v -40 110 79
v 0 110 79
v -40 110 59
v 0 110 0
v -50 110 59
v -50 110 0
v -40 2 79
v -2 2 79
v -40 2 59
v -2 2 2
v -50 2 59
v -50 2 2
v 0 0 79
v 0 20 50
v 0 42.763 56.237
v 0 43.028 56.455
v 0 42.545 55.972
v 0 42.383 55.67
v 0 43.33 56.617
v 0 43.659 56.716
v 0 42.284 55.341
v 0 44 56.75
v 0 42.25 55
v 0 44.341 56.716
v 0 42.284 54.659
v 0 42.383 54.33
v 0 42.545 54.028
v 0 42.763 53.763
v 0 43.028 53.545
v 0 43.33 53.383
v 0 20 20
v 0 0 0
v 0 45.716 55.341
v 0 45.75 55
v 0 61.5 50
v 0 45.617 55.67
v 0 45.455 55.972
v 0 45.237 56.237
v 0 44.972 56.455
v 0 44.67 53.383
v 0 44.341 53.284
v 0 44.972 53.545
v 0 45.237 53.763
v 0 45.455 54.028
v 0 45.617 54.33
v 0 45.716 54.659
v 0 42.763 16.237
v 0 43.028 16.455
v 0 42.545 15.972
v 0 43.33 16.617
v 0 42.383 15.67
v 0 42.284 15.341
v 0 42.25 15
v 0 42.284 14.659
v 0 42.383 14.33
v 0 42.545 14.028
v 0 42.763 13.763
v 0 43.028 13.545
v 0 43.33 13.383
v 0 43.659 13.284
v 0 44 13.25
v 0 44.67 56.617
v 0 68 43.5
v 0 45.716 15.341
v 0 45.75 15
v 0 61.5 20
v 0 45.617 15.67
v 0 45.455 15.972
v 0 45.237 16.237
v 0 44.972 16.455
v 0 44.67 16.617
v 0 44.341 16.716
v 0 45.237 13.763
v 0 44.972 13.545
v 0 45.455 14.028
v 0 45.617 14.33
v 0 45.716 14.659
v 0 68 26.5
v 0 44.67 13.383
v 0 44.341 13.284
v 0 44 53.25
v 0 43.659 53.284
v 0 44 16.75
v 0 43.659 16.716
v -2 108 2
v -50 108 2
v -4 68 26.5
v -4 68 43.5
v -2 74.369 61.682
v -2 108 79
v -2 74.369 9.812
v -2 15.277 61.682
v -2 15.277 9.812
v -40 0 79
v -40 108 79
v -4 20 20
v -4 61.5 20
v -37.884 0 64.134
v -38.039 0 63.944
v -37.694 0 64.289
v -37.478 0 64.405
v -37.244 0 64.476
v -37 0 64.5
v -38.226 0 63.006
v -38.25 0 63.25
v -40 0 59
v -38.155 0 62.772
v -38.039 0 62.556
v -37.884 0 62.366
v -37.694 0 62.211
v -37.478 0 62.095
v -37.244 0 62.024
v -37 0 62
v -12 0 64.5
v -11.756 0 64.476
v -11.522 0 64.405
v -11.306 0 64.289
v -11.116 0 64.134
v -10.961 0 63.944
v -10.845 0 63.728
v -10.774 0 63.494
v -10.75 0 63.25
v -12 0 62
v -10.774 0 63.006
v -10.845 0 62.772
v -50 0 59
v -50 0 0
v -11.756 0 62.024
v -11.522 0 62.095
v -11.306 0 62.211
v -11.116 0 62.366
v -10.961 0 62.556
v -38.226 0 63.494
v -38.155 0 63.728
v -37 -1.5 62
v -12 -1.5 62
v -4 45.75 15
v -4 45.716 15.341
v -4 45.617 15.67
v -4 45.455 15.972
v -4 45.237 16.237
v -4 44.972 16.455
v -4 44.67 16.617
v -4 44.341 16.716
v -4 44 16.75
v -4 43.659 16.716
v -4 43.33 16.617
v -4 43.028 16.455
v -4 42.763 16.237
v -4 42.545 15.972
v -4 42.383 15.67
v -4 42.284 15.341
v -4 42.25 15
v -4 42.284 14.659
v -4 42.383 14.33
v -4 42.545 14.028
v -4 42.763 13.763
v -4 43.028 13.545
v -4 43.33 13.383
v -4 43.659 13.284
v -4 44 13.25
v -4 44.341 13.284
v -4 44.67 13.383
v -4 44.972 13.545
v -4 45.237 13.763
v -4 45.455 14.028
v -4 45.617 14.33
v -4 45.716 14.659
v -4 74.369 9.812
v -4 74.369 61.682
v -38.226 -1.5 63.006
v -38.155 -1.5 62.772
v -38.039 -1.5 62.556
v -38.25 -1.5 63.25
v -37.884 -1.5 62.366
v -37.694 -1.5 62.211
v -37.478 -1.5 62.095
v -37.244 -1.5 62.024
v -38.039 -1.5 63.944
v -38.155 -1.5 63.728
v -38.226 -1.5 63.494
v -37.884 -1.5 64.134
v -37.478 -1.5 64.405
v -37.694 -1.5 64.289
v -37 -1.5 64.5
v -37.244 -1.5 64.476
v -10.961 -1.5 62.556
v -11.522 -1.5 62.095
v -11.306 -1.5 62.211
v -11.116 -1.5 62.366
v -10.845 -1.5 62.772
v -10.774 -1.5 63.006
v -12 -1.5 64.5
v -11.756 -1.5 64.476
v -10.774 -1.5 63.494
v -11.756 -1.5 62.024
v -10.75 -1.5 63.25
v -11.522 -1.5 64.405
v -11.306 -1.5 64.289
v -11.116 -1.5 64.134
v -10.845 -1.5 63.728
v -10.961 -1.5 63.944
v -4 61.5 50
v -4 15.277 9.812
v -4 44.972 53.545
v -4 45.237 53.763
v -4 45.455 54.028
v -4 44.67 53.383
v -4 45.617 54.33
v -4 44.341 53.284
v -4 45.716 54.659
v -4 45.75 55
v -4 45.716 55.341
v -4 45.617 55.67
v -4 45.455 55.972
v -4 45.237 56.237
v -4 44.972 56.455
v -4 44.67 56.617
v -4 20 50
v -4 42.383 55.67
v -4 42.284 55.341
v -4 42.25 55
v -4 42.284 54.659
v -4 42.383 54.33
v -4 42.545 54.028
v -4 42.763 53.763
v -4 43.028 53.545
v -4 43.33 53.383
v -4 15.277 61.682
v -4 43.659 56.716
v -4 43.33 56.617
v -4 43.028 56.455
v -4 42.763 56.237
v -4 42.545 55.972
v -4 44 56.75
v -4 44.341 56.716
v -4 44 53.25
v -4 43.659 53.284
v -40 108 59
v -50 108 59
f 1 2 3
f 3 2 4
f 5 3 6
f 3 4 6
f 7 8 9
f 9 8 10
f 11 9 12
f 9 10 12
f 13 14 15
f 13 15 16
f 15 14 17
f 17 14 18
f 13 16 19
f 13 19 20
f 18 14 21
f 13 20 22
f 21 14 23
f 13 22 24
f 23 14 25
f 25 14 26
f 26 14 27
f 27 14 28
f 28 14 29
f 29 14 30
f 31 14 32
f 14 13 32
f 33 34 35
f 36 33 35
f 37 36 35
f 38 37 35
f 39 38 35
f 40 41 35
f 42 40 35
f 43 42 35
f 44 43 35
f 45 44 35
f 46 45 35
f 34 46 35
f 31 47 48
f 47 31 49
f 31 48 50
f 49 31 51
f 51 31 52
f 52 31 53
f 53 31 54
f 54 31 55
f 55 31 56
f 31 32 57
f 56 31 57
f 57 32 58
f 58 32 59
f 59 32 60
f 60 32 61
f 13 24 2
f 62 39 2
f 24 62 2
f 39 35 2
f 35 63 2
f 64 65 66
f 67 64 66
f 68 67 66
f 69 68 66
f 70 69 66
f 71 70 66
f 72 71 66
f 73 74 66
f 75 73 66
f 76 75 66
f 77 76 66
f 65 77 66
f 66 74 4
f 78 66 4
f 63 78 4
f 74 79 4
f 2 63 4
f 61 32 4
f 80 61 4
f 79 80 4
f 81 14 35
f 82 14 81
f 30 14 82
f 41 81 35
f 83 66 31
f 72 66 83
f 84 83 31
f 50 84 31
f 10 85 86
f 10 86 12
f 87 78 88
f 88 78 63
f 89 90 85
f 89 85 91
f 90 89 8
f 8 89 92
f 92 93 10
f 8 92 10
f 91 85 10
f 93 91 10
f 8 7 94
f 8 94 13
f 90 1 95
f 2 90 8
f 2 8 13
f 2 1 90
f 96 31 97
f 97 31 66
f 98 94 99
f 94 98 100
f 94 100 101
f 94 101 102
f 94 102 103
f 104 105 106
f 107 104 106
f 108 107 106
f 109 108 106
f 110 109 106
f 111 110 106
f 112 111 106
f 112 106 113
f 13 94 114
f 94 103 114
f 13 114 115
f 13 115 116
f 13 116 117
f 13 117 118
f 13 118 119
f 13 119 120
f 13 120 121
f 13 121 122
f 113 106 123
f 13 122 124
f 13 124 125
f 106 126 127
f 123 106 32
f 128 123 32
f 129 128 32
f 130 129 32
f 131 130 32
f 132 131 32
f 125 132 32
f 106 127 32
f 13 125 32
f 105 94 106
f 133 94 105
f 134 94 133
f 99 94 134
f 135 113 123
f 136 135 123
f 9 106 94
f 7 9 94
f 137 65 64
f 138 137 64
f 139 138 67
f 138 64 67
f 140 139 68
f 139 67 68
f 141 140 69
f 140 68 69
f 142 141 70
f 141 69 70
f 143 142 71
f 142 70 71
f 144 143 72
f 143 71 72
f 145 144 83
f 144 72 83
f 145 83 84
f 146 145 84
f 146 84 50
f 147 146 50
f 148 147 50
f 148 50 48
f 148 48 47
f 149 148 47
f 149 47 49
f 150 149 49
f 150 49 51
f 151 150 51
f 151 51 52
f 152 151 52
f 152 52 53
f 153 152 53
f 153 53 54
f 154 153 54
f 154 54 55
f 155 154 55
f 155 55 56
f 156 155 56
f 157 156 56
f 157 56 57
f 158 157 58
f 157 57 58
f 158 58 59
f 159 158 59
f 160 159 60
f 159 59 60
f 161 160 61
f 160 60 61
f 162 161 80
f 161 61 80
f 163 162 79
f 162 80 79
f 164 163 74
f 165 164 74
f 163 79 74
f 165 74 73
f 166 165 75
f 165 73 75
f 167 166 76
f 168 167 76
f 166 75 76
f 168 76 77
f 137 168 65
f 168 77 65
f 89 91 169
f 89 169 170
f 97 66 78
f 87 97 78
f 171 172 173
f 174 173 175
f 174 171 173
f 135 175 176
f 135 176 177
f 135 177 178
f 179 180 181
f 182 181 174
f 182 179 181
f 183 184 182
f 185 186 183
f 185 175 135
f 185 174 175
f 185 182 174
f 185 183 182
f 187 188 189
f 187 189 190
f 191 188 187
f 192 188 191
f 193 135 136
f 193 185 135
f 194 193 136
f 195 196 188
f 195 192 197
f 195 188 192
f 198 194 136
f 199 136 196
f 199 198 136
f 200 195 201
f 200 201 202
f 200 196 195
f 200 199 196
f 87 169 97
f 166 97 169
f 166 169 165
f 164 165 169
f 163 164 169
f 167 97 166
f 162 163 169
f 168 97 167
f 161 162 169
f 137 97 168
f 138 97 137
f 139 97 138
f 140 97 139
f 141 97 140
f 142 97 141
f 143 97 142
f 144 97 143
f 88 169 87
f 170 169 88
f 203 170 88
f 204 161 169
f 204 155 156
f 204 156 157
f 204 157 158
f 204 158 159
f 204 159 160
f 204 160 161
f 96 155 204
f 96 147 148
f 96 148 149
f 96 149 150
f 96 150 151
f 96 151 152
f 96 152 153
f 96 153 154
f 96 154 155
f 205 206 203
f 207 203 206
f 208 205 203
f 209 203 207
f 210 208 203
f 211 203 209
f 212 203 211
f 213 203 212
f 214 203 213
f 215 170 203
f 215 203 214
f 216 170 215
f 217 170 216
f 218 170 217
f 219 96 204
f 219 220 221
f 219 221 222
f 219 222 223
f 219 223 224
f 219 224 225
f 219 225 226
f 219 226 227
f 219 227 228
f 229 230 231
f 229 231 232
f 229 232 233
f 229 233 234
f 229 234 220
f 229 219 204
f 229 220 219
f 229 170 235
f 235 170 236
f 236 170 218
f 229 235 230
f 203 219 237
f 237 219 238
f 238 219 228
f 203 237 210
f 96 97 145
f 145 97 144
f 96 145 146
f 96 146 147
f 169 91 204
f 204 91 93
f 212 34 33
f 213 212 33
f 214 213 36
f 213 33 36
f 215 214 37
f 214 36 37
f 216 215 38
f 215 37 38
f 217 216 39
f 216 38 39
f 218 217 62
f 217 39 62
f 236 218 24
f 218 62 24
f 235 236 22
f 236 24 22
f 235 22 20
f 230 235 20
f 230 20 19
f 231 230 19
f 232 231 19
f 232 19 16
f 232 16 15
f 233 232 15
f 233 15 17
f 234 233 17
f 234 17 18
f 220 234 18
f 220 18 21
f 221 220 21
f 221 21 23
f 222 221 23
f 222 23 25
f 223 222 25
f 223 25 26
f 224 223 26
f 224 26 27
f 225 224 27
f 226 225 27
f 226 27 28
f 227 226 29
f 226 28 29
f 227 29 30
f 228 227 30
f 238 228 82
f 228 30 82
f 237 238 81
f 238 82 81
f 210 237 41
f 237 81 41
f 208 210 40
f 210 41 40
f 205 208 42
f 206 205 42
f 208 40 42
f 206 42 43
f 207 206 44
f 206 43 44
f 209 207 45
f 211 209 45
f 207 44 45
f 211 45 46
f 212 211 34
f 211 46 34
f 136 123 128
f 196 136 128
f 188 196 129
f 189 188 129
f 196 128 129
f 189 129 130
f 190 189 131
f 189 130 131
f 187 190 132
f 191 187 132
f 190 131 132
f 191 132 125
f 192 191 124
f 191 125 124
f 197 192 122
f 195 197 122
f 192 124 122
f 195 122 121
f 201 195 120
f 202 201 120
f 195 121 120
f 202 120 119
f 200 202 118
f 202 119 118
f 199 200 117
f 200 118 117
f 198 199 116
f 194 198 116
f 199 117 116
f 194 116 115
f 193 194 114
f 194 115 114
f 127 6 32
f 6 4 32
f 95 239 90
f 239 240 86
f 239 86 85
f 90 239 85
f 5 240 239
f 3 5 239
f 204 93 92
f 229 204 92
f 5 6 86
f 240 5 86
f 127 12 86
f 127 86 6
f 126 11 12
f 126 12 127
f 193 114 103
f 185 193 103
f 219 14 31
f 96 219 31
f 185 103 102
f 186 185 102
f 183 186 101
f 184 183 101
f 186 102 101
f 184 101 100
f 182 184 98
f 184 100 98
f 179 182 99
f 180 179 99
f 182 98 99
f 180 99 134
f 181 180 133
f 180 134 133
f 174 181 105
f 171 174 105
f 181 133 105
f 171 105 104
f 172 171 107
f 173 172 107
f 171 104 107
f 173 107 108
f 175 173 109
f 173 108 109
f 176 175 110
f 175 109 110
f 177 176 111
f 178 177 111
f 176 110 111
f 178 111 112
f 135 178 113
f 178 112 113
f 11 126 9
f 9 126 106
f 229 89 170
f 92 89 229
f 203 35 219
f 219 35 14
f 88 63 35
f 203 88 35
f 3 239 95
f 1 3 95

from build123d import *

# Parameters (mm, degrees)
F1_DEPTH  = 79
F2_W      = 106
F2_H      = 2
F3_DEPTH  = 48
F4_W      = 10
F4_H      = 20
F5_DEPTH  = 150
F6_W      = 59.092542
F6_H      = 51.87012
F7_DEPTH  = 2
F8_R      = 1.75
F9_DEPTH  = 25
F11_DEPTH = 1.5


with BuildPart() as f1:
    # F0 (on Top) → F1 (new body)
    with BuildSketch(Plane.XY):
        Polygon((0, 110), (-50, 110), (-50, 108), (-2, 108), (-2, 2), (-50, 2), (-50, 0), (0, 0), align=None)
    extrude(amount=F1_DEPTH)

    # F2 (on face) → F3 (join)
    with BuildSketch(Plane(origin=(-2, 0, 0), x_dir=(0, -1, 0), z_dir=(-1, 0, 0))):
        with Locations((-55, 1)):
            Rectangle(F2_W, F2_H)
    extrude(amount=F3_DEPTH)

    # F4 (on face) → F5 (cut)
    with BuildSketch(Plane.XZ):
        with Locations((-45, 69)):
            Rectangle(F4_W, F4_H)
    extrude(amount=-F5_DEPTH, mode=Mode.SUBTRACT)

    # F6 (on face) → F7 (join)
    with BuildSketch(Plane(origin=(-2, 0, 0), x_dir=(0, -1, 0), z_dir=(-1, 0, 0))):
        with Locations((-44.822951, 35.747332)):
            Rectangle(F6_W, F6_H)
    extrude(amount=F7_DEPTH)

    # F8 (on face) → F9 (cut)
    with BuildSketch(Plane.YZ):
        Polygon((61.5, 50), (20, 50), (20, 20), (61.5, 20), (68, 26.5), (68, 43.5), align=None)
        with Locations((44, 55)):
            Circle(F8_R)
        with Locations((44, 15)):
            Circle(F8_R)
    extrude(amount=-F9_DEPTH, mode=Mode.SUBTRACT)

    # F10 (on face) → F11 (join)
    with BuildSketch(Plane.XZ):
        with BuildLine():
            Line((-37, 62), (-12, 62))
            ThreePointArc((-12, 62), (-10.75, 63.25), (-12, 64.5))
            Line((-12, 64.5), (-37, 64.5))
            ThreePointArc((-37, 64.5), (-38.25, 63.25), (-37, 62))
        make_face()
    extrude(amount=F11_DEPTH)


solid = f1.part
